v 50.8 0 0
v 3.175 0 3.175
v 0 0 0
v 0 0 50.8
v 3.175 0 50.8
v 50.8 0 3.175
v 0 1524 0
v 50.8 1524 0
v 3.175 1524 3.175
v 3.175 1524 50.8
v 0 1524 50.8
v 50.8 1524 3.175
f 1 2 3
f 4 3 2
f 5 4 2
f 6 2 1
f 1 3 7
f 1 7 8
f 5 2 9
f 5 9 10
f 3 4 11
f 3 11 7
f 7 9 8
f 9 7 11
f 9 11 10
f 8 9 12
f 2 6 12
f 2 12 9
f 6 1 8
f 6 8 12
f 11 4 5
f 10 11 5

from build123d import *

# Parameters (mm, degrees)
F0_W     = 3.175
F0_H     = 3.175
F0_W_2   = 47.625
F0_H_2   = 47.625
F1_DEPTH = 1524


with BuildPart() as f1:
    # F0 (on Front) → F1 (new body)
    with BuildSketch(Plane.XZ):
        with Locations((1.5875, 1.5875)):
            Rectangle(F0_W, F0_H)
        with Locations((26.9875, 1.5875)):
            Rectangle(F0_W_2, F0_H)
        with Locations((1.5875, 26.9875)):
            Rectangle(F0_W, F0_H_2)
    extrude(amount=-F1_DEPTH)


solid = f1.part
